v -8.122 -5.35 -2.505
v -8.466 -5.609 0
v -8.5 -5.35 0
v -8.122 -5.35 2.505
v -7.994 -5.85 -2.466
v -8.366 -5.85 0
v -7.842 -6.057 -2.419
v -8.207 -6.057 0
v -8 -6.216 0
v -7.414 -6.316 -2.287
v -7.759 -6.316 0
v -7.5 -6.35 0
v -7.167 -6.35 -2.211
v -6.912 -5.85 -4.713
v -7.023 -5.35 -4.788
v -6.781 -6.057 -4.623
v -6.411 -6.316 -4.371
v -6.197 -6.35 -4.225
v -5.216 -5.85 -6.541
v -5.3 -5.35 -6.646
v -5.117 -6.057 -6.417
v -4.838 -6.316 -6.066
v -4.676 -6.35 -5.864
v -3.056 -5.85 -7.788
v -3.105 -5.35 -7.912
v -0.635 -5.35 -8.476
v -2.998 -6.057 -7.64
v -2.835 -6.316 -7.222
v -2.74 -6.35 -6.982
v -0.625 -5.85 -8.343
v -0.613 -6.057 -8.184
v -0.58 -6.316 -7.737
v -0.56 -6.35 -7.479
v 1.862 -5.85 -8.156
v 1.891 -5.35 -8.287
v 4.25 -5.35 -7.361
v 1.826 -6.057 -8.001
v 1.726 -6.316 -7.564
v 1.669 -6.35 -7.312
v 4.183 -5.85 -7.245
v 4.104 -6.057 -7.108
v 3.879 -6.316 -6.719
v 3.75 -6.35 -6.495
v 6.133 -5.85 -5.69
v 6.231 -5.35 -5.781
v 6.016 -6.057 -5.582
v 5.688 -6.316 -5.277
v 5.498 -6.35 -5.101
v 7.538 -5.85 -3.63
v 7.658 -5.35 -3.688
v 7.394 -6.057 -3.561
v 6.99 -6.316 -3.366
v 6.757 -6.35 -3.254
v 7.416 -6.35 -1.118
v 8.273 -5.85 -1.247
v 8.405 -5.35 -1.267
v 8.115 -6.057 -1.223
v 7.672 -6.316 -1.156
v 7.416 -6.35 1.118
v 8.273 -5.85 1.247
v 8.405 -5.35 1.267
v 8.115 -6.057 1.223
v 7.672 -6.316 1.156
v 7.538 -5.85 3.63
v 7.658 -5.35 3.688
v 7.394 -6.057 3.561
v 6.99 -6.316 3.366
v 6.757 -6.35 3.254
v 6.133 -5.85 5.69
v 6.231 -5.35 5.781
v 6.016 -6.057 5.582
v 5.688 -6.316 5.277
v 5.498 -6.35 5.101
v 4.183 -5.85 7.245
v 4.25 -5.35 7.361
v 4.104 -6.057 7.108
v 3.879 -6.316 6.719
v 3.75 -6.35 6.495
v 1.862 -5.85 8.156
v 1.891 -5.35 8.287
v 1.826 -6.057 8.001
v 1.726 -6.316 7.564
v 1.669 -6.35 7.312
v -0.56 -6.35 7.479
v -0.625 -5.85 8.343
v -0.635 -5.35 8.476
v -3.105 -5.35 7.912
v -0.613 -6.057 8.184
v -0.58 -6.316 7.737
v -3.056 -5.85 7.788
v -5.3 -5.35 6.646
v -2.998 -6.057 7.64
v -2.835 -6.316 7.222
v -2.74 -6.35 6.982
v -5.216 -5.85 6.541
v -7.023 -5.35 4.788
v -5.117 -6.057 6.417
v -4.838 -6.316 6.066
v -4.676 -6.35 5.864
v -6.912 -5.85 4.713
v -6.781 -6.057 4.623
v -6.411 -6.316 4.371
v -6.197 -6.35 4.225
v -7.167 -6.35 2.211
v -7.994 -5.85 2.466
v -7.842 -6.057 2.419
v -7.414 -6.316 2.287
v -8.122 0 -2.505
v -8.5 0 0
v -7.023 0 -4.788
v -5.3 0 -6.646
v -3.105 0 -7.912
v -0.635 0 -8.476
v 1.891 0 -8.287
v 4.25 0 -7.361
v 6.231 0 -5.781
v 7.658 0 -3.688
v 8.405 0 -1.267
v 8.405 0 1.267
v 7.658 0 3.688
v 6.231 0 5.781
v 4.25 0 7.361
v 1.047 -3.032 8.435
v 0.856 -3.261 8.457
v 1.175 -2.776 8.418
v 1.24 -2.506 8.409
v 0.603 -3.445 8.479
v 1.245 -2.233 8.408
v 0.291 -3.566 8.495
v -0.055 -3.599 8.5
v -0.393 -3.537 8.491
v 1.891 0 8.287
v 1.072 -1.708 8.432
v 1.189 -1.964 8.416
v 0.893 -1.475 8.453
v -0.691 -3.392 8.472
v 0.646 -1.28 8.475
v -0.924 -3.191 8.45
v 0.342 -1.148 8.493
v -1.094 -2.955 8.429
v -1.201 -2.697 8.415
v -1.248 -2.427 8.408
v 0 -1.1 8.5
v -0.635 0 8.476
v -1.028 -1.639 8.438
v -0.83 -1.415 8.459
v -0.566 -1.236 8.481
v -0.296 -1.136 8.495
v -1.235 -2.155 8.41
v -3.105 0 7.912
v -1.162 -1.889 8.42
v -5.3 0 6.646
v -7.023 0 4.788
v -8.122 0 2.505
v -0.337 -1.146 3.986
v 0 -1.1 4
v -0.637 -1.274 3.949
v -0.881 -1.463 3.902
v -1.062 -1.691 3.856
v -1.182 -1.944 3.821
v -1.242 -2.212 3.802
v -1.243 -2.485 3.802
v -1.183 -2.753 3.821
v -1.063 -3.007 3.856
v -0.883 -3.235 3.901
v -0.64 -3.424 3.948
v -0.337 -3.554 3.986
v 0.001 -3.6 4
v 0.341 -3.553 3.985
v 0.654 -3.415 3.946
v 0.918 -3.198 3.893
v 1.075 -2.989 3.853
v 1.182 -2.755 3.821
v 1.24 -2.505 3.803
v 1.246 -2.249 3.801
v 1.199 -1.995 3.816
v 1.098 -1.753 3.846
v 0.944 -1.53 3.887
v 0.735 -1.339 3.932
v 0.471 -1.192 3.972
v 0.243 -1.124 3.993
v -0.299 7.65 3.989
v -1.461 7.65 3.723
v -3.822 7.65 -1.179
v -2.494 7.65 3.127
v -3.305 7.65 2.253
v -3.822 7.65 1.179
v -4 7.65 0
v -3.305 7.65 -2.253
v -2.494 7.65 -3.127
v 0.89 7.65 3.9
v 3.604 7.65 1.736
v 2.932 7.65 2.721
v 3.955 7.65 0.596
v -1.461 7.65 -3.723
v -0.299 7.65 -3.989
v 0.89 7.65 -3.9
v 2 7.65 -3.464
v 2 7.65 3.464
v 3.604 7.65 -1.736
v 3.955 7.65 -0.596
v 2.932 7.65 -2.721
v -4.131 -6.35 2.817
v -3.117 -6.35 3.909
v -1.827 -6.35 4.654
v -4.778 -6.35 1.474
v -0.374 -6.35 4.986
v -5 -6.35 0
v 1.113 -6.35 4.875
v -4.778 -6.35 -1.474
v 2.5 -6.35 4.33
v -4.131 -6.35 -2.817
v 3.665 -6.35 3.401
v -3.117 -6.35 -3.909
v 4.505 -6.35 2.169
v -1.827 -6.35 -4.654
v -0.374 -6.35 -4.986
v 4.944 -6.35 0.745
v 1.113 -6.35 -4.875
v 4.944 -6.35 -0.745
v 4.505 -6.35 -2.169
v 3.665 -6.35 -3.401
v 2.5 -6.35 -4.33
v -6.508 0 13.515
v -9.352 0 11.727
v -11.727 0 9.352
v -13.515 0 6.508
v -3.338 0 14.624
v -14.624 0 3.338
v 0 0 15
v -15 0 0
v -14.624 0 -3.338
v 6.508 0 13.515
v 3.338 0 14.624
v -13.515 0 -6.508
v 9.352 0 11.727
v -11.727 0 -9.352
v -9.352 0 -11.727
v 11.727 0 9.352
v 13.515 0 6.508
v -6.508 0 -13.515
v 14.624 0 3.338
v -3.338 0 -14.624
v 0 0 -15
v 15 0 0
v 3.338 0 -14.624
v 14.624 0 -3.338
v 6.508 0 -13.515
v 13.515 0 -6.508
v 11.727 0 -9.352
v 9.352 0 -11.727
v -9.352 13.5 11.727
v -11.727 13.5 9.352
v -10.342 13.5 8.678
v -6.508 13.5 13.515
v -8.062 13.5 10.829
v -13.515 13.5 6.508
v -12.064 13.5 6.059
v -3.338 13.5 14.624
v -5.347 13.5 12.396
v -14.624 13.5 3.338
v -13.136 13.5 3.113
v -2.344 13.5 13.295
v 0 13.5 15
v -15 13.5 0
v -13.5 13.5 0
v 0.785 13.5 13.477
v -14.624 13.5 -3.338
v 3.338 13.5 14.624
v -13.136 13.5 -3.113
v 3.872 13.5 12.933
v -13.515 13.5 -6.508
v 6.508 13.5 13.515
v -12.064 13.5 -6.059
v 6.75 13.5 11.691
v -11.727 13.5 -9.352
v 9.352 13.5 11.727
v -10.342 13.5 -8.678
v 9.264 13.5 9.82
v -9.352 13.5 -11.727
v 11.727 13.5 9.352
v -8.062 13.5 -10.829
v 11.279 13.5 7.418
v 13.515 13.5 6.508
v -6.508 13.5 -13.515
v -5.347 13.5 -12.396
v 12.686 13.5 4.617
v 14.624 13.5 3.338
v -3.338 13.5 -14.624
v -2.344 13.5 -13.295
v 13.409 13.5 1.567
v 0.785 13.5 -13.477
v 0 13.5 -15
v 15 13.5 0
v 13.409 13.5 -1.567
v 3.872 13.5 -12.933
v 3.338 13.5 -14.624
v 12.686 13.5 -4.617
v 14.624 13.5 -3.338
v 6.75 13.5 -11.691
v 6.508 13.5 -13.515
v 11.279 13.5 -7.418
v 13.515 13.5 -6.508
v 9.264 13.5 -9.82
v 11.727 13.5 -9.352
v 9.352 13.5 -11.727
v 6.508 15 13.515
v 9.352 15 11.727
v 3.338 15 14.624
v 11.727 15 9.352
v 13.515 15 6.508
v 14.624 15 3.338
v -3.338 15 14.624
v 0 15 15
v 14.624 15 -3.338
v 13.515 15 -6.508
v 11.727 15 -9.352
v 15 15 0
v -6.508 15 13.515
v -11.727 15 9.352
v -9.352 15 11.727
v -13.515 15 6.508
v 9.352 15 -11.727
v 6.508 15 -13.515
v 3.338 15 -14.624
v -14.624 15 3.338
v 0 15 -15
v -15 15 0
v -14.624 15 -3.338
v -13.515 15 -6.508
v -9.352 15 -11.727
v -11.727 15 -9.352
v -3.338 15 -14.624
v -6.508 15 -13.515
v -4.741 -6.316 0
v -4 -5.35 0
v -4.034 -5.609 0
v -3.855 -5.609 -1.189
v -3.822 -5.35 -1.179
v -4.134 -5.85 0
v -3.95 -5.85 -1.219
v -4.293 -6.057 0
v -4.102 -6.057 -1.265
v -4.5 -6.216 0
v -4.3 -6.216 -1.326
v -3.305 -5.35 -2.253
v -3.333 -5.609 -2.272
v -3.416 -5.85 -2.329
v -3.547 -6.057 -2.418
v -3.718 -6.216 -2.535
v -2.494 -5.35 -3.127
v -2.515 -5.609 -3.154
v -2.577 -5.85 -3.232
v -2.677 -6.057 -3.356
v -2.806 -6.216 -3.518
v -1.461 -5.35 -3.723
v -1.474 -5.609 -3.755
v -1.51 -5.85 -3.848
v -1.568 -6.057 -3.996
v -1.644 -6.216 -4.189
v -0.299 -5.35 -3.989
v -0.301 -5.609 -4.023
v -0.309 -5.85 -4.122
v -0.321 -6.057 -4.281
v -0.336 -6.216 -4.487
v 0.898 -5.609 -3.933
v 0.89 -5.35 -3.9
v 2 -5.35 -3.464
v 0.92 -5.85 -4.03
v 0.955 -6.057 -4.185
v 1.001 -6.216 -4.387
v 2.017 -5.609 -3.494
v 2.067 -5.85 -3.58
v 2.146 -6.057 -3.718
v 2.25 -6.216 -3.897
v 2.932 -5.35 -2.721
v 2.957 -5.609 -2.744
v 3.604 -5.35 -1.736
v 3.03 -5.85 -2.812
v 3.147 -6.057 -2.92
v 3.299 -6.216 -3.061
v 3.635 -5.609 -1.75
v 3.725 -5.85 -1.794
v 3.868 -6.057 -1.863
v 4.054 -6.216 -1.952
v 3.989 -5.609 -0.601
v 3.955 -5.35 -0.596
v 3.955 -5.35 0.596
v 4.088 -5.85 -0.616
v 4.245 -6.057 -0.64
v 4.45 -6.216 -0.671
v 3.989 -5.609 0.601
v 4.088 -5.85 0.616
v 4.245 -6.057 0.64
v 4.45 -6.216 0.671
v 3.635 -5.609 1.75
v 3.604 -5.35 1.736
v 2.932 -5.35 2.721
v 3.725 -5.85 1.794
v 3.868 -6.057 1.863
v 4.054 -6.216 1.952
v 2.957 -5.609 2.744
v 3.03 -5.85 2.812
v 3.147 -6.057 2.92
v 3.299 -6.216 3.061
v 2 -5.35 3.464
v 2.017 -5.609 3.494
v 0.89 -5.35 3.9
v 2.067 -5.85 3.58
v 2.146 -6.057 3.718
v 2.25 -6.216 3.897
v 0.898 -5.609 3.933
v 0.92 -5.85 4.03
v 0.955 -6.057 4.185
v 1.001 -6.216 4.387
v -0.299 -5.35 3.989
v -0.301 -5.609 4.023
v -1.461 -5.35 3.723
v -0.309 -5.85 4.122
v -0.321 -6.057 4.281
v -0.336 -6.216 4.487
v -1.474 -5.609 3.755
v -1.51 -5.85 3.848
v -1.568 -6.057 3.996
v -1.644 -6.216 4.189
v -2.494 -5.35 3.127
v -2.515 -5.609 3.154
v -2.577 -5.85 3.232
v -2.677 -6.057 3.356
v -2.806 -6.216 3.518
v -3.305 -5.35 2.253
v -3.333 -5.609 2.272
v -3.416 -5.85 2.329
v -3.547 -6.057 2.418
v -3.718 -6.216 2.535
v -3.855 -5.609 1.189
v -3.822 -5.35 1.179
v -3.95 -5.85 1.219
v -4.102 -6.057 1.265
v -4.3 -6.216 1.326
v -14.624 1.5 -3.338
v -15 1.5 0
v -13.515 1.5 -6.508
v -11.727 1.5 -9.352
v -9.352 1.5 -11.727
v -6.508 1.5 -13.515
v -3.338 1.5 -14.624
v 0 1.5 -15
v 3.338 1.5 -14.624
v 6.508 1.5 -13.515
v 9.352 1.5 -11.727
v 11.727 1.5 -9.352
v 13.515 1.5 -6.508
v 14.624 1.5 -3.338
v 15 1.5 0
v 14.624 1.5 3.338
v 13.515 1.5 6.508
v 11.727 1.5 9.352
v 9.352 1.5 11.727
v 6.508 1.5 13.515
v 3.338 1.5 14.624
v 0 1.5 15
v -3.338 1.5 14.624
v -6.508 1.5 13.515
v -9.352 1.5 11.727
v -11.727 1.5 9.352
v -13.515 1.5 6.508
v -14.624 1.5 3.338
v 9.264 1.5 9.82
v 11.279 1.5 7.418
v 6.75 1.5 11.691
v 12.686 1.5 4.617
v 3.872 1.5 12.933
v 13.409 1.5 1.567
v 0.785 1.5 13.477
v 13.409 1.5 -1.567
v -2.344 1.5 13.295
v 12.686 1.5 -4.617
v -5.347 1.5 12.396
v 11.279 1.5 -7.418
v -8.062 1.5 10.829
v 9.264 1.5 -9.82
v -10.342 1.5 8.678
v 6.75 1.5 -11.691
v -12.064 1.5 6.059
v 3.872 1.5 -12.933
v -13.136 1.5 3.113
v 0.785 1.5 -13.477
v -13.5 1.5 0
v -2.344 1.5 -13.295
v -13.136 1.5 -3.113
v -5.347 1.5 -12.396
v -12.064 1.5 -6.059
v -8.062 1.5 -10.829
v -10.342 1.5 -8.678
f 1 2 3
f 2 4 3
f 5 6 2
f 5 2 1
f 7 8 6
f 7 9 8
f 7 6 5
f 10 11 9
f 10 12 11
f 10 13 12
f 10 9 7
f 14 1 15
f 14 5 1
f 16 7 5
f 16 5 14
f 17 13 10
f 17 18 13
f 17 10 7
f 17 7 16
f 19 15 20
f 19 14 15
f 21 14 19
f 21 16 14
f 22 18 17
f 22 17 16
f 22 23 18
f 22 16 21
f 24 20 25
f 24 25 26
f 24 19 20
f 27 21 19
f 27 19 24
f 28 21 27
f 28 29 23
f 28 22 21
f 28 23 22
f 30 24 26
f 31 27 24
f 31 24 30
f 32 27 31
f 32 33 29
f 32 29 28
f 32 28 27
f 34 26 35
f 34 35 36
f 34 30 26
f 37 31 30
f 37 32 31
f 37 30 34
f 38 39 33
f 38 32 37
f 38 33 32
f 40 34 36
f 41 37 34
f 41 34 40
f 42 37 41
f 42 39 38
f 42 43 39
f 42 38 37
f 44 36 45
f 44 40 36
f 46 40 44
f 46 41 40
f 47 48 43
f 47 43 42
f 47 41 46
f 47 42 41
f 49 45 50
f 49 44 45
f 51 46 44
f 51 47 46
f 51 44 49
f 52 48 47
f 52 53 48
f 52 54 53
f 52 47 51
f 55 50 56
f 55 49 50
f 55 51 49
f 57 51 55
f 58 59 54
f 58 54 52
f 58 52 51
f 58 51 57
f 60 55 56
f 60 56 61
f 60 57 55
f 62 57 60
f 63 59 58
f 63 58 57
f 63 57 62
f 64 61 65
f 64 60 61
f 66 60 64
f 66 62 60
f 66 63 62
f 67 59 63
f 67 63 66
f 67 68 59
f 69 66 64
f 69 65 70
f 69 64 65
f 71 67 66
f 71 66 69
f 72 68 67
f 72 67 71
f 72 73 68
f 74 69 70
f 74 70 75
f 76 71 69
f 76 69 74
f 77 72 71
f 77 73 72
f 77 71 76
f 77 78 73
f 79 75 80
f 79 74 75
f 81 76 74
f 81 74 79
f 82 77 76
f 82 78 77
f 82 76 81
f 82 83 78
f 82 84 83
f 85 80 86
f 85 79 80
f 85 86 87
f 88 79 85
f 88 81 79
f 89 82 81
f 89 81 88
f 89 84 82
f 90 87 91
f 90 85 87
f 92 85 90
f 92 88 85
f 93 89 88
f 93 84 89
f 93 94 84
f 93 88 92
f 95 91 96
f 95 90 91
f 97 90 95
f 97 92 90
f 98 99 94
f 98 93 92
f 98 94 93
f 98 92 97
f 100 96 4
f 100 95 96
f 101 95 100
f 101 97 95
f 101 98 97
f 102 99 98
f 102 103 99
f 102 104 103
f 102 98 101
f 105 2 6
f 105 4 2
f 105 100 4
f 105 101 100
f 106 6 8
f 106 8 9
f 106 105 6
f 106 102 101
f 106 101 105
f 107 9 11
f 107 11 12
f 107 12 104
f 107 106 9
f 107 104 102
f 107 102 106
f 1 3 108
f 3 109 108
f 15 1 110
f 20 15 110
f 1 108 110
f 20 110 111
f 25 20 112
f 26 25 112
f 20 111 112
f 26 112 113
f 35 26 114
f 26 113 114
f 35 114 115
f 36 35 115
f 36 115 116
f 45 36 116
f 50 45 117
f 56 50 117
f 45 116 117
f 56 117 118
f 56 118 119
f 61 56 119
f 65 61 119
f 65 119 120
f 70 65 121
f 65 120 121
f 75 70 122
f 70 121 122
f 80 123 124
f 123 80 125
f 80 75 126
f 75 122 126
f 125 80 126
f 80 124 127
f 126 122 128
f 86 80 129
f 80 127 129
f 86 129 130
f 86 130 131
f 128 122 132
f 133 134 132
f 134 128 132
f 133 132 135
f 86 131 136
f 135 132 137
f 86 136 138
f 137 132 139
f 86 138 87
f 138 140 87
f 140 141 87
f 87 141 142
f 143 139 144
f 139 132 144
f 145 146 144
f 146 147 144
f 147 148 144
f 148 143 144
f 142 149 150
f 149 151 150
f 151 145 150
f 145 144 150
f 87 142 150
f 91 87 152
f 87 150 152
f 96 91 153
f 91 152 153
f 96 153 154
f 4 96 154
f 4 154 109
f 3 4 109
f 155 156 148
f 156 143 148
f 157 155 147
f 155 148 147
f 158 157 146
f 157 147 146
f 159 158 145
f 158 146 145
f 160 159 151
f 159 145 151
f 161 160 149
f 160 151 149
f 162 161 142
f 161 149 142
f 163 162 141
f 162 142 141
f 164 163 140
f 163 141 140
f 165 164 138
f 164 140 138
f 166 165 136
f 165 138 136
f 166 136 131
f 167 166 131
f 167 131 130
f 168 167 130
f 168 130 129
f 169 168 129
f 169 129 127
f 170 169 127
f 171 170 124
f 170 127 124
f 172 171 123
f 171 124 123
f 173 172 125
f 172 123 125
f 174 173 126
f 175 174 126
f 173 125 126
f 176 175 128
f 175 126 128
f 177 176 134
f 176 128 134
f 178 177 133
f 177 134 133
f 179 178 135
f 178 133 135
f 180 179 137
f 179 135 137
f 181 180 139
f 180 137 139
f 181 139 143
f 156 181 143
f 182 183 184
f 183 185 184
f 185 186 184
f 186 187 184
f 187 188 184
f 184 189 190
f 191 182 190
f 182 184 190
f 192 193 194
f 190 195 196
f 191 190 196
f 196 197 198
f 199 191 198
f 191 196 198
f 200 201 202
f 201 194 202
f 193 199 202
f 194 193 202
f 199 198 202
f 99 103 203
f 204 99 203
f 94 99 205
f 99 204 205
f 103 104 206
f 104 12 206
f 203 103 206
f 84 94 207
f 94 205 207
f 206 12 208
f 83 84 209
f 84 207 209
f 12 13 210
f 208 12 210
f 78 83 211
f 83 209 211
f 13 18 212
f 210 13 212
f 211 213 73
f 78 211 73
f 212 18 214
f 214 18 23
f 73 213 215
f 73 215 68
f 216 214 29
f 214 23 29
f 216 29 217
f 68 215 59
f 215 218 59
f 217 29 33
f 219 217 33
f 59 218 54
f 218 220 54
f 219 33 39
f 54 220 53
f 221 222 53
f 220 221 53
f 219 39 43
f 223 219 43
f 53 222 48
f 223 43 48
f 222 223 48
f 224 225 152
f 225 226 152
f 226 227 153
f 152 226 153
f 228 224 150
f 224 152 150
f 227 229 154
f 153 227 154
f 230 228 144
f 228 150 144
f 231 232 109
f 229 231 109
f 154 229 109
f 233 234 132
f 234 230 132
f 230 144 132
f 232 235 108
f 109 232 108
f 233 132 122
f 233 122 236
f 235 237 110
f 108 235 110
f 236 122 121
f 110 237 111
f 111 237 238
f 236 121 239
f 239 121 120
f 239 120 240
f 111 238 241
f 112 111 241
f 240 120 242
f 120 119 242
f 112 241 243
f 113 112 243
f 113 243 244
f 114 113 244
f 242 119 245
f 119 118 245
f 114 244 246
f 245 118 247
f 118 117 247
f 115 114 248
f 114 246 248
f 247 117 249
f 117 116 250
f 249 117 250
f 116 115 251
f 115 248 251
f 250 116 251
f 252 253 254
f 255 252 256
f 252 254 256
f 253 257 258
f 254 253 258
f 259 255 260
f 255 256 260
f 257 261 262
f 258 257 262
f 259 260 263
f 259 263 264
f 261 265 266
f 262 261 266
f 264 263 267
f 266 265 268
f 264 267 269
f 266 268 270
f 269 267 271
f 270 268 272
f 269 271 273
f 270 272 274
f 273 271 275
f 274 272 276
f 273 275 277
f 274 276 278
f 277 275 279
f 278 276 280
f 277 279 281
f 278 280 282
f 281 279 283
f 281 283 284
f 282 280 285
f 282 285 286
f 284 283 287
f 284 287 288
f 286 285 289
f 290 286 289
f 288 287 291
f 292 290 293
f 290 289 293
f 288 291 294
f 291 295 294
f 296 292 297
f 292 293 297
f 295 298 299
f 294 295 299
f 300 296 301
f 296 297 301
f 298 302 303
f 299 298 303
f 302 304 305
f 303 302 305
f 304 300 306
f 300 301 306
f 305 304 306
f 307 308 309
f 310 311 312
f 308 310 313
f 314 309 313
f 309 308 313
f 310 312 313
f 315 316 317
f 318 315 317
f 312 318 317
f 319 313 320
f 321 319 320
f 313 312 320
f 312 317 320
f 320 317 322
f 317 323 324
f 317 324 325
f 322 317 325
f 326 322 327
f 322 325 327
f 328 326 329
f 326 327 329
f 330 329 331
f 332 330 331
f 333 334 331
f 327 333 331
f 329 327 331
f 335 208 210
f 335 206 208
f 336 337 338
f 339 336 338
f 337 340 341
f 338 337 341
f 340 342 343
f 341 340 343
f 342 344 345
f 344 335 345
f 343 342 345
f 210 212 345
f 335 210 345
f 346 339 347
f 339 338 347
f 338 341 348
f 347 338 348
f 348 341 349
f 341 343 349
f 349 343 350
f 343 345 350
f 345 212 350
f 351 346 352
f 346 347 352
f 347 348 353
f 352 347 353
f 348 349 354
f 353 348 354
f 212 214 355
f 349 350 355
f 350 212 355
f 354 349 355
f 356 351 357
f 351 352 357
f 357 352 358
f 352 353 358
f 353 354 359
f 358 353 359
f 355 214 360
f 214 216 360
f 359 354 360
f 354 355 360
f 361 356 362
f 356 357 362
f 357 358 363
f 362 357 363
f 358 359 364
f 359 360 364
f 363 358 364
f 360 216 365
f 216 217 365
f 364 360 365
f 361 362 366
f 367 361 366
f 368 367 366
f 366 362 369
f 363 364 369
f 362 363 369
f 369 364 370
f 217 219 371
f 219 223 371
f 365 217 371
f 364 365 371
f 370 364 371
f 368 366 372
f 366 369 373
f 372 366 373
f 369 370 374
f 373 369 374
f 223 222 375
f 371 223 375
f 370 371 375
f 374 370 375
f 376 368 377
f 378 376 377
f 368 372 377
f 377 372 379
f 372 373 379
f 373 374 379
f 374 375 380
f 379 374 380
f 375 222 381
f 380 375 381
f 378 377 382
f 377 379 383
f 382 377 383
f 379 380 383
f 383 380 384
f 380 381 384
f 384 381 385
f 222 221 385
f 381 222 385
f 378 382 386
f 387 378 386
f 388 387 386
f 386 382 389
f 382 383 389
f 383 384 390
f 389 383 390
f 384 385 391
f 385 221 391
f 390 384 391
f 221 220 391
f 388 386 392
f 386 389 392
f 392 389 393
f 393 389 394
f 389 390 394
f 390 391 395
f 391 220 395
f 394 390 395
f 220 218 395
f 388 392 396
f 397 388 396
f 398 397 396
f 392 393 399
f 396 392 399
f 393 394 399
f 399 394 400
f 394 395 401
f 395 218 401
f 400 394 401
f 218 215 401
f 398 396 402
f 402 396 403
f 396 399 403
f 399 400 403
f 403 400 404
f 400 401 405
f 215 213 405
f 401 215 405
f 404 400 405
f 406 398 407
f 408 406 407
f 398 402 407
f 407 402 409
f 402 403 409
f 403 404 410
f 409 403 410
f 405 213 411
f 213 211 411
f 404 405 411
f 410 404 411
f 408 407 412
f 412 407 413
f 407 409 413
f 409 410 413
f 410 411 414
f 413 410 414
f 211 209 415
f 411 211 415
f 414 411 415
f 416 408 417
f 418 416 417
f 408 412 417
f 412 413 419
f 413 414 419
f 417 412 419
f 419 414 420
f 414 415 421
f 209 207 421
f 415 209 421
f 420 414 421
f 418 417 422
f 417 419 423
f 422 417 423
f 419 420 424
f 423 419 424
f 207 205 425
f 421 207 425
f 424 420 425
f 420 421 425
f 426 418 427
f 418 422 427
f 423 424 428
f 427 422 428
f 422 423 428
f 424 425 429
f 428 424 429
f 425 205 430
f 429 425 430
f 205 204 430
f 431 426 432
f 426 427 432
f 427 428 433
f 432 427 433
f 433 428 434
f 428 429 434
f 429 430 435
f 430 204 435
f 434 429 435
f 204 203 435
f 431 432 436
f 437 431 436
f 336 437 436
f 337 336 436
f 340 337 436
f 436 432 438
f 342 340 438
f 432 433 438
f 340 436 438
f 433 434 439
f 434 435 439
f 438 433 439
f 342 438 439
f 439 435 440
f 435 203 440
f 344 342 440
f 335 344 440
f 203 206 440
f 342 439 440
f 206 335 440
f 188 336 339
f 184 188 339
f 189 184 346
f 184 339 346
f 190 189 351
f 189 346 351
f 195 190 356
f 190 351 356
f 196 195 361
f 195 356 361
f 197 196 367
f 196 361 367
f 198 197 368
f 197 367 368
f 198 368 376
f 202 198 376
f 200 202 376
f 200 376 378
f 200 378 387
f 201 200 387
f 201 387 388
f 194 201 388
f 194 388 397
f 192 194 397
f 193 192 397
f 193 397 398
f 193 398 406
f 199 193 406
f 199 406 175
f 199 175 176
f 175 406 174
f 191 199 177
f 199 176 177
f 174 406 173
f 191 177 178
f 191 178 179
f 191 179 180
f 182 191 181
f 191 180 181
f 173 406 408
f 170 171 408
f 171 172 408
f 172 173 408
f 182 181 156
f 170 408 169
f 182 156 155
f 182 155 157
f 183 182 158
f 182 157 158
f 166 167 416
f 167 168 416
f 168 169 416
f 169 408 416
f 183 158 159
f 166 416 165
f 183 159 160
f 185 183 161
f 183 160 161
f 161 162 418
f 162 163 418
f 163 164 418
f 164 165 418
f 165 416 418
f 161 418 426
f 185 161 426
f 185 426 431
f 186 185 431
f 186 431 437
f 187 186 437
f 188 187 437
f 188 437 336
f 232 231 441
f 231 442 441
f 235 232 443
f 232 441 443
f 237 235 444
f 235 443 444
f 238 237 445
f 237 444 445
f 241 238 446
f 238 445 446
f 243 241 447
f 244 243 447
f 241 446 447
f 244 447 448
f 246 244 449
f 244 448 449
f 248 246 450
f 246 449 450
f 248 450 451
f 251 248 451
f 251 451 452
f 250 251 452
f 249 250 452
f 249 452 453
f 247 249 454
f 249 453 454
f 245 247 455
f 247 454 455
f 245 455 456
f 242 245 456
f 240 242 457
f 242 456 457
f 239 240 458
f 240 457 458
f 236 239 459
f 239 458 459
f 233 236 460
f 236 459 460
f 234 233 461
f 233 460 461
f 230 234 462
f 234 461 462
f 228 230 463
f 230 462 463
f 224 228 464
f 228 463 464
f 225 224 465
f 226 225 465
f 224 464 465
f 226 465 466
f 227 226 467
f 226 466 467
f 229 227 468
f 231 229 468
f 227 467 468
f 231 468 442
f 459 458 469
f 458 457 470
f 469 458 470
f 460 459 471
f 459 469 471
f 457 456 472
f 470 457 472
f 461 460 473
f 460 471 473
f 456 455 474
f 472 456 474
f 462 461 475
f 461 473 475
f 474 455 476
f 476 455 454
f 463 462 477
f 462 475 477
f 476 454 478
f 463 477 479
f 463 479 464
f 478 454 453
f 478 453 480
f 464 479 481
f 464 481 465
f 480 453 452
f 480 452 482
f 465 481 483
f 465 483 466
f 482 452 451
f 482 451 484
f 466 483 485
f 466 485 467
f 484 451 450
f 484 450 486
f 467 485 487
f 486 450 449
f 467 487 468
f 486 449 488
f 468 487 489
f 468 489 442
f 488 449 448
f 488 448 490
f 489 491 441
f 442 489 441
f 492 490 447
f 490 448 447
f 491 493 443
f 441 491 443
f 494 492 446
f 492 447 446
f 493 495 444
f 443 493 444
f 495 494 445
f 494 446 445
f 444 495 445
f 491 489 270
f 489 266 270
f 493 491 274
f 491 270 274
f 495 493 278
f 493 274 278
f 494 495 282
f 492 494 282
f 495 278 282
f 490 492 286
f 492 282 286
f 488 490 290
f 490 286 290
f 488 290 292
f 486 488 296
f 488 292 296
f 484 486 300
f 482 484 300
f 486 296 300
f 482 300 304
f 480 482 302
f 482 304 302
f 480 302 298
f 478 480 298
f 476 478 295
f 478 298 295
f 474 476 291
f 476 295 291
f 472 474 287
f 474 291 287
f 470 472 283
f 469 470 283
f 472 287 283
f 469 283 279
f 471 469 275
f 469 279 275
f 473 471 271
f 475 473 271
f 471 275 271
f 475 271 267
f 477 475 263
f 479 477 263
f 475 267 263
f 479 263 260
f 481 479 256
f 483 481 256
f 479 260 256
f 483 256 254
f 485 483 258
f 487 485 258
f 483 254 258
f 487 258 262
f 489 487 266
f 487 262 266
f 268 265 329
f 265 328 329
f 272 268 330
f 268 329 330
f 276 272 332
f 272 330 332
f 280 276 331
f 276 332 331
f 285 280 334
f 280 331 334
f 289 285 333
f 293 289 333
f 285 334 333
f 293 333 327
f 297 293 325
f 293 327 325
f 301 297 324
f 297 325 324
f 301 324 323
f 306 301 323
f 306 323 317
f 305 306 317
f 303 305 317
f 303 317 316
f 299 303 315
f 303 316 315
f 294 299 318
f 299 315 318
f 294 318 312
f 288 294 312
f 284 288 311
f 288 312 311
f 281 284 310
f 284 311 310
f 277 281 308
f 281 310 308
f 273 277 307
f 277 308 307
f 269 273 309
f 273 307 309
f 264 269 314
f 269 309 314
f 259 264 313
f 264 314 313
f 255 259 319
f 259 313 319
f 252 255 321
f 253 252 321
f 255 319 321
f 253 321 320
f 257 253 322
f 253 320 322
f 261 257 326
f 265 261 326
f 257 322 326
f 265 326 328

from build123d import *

# Parameters (mm, degrees)
FILLET1_R = 1
SKETCH3_W = 1.25
SKETCH3_H = 8.5


with BuildPart() as part:
    # Sketch1 → Revolve1 (revolve)
    with BuildSketch(Plane.XY):
        Polygon((-8.5, -6.35), (-8.5, 0), (-15, 0), (-15, 1.5), (-13.5, 1.5), (-13.5, 13.5), (-15, 13.5), (-15, 15), (0, 15), (0, 7.65), (-4, 7.65), (-4, -6.35), align=None)
    revolve(axis=Axis((0, 15, 0), (0, -1, 0)))

    # Fillet1
    fillet1_edges = [part.edges().sort_by_distance(p)[0] for p in [
        (8.5, -6.35, 0),
        (4, -6.35, 0),
    ]]
    fillet(fillet1_edges, radius=FILLET1_R)

    # Sketch3 → M3x0.5 Tapped Hole1 (revolve, cut)
    with BuildSketch(Plane(origin=(0, -2.35, 0), x_dir=(0, 1, 0), z_dir=(1, 0, 0))):
        with Locations((0.625, 4.25)):
            Rectangle(SKETCH3_W, SKETCH3_H)
    revolve(axis=Axis((0, -2.35, -6.35), (0, 0, 1)), mode=Mode.SUBTRACT)


solid = part.part
